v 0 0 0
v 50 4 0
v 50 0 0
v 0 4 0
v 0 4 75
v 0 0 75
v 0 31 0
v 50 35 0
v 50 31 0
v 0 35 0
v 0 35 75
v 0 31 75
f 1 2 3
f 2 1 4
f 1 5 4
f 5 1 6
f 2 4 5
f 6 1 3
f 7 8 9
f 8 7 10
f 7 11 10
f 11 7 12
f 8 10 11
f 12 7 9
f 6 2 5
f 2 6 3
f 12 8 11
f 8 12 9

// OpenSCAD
/*
	module shelf_bracket

	parameters:	
	- side_a    is a vector [length, hole diameter, number of holes]
	- side_b    is a vector [length, hole diameter, number of holes]
	- width     refers to the width of the bracket
	- thickness refers to the material thickness of the bracket
 */

module shelf_bracket( side_a, side_b, width, thickness ) {

}

shelf_bracket(
  side_a    = [50, 6, 1],
  side_b    = [75, 4, 3],
  width     = 35,
  thickness = 4
);

/* ... */


module shelf_bracket( side_a, side_b, width, thickness ) {

	module xhole_plate(size, h_dm, h_num, margin) {
		/* ... */
	}

	difference() {

		union() {

			// side A
			xhole_plate(
				[side_a[0], width, thickness],
				side_a[1],
				side_a[2],
				thickness
			);

			// side B
		    translate([thickness,0,0])
		    rotate([0,-90,0])
			xhole_plate(
				[side_b[0], width, thickness],
				side_b[1],
				side_b[2],
				thickness
			);

			// stringer
			cube( [side_a[0], thickness, side_b[0]] );

			translate( [0, width - thickness, 0] )
			cube( [side_a[0], thickness, side_b[0]] );

		}

		diag  = sqrt( pow(side_a[0], 2) + pow(side_b[0], 2) );
		angle = asin( side_a[0] / diag );

		translate( [side_a[0], -1, 0] )
		rotate( [0, -angle, 0] )
		cube( [diag, width + 2, diag + 2] );

	}

}
/* ... */
